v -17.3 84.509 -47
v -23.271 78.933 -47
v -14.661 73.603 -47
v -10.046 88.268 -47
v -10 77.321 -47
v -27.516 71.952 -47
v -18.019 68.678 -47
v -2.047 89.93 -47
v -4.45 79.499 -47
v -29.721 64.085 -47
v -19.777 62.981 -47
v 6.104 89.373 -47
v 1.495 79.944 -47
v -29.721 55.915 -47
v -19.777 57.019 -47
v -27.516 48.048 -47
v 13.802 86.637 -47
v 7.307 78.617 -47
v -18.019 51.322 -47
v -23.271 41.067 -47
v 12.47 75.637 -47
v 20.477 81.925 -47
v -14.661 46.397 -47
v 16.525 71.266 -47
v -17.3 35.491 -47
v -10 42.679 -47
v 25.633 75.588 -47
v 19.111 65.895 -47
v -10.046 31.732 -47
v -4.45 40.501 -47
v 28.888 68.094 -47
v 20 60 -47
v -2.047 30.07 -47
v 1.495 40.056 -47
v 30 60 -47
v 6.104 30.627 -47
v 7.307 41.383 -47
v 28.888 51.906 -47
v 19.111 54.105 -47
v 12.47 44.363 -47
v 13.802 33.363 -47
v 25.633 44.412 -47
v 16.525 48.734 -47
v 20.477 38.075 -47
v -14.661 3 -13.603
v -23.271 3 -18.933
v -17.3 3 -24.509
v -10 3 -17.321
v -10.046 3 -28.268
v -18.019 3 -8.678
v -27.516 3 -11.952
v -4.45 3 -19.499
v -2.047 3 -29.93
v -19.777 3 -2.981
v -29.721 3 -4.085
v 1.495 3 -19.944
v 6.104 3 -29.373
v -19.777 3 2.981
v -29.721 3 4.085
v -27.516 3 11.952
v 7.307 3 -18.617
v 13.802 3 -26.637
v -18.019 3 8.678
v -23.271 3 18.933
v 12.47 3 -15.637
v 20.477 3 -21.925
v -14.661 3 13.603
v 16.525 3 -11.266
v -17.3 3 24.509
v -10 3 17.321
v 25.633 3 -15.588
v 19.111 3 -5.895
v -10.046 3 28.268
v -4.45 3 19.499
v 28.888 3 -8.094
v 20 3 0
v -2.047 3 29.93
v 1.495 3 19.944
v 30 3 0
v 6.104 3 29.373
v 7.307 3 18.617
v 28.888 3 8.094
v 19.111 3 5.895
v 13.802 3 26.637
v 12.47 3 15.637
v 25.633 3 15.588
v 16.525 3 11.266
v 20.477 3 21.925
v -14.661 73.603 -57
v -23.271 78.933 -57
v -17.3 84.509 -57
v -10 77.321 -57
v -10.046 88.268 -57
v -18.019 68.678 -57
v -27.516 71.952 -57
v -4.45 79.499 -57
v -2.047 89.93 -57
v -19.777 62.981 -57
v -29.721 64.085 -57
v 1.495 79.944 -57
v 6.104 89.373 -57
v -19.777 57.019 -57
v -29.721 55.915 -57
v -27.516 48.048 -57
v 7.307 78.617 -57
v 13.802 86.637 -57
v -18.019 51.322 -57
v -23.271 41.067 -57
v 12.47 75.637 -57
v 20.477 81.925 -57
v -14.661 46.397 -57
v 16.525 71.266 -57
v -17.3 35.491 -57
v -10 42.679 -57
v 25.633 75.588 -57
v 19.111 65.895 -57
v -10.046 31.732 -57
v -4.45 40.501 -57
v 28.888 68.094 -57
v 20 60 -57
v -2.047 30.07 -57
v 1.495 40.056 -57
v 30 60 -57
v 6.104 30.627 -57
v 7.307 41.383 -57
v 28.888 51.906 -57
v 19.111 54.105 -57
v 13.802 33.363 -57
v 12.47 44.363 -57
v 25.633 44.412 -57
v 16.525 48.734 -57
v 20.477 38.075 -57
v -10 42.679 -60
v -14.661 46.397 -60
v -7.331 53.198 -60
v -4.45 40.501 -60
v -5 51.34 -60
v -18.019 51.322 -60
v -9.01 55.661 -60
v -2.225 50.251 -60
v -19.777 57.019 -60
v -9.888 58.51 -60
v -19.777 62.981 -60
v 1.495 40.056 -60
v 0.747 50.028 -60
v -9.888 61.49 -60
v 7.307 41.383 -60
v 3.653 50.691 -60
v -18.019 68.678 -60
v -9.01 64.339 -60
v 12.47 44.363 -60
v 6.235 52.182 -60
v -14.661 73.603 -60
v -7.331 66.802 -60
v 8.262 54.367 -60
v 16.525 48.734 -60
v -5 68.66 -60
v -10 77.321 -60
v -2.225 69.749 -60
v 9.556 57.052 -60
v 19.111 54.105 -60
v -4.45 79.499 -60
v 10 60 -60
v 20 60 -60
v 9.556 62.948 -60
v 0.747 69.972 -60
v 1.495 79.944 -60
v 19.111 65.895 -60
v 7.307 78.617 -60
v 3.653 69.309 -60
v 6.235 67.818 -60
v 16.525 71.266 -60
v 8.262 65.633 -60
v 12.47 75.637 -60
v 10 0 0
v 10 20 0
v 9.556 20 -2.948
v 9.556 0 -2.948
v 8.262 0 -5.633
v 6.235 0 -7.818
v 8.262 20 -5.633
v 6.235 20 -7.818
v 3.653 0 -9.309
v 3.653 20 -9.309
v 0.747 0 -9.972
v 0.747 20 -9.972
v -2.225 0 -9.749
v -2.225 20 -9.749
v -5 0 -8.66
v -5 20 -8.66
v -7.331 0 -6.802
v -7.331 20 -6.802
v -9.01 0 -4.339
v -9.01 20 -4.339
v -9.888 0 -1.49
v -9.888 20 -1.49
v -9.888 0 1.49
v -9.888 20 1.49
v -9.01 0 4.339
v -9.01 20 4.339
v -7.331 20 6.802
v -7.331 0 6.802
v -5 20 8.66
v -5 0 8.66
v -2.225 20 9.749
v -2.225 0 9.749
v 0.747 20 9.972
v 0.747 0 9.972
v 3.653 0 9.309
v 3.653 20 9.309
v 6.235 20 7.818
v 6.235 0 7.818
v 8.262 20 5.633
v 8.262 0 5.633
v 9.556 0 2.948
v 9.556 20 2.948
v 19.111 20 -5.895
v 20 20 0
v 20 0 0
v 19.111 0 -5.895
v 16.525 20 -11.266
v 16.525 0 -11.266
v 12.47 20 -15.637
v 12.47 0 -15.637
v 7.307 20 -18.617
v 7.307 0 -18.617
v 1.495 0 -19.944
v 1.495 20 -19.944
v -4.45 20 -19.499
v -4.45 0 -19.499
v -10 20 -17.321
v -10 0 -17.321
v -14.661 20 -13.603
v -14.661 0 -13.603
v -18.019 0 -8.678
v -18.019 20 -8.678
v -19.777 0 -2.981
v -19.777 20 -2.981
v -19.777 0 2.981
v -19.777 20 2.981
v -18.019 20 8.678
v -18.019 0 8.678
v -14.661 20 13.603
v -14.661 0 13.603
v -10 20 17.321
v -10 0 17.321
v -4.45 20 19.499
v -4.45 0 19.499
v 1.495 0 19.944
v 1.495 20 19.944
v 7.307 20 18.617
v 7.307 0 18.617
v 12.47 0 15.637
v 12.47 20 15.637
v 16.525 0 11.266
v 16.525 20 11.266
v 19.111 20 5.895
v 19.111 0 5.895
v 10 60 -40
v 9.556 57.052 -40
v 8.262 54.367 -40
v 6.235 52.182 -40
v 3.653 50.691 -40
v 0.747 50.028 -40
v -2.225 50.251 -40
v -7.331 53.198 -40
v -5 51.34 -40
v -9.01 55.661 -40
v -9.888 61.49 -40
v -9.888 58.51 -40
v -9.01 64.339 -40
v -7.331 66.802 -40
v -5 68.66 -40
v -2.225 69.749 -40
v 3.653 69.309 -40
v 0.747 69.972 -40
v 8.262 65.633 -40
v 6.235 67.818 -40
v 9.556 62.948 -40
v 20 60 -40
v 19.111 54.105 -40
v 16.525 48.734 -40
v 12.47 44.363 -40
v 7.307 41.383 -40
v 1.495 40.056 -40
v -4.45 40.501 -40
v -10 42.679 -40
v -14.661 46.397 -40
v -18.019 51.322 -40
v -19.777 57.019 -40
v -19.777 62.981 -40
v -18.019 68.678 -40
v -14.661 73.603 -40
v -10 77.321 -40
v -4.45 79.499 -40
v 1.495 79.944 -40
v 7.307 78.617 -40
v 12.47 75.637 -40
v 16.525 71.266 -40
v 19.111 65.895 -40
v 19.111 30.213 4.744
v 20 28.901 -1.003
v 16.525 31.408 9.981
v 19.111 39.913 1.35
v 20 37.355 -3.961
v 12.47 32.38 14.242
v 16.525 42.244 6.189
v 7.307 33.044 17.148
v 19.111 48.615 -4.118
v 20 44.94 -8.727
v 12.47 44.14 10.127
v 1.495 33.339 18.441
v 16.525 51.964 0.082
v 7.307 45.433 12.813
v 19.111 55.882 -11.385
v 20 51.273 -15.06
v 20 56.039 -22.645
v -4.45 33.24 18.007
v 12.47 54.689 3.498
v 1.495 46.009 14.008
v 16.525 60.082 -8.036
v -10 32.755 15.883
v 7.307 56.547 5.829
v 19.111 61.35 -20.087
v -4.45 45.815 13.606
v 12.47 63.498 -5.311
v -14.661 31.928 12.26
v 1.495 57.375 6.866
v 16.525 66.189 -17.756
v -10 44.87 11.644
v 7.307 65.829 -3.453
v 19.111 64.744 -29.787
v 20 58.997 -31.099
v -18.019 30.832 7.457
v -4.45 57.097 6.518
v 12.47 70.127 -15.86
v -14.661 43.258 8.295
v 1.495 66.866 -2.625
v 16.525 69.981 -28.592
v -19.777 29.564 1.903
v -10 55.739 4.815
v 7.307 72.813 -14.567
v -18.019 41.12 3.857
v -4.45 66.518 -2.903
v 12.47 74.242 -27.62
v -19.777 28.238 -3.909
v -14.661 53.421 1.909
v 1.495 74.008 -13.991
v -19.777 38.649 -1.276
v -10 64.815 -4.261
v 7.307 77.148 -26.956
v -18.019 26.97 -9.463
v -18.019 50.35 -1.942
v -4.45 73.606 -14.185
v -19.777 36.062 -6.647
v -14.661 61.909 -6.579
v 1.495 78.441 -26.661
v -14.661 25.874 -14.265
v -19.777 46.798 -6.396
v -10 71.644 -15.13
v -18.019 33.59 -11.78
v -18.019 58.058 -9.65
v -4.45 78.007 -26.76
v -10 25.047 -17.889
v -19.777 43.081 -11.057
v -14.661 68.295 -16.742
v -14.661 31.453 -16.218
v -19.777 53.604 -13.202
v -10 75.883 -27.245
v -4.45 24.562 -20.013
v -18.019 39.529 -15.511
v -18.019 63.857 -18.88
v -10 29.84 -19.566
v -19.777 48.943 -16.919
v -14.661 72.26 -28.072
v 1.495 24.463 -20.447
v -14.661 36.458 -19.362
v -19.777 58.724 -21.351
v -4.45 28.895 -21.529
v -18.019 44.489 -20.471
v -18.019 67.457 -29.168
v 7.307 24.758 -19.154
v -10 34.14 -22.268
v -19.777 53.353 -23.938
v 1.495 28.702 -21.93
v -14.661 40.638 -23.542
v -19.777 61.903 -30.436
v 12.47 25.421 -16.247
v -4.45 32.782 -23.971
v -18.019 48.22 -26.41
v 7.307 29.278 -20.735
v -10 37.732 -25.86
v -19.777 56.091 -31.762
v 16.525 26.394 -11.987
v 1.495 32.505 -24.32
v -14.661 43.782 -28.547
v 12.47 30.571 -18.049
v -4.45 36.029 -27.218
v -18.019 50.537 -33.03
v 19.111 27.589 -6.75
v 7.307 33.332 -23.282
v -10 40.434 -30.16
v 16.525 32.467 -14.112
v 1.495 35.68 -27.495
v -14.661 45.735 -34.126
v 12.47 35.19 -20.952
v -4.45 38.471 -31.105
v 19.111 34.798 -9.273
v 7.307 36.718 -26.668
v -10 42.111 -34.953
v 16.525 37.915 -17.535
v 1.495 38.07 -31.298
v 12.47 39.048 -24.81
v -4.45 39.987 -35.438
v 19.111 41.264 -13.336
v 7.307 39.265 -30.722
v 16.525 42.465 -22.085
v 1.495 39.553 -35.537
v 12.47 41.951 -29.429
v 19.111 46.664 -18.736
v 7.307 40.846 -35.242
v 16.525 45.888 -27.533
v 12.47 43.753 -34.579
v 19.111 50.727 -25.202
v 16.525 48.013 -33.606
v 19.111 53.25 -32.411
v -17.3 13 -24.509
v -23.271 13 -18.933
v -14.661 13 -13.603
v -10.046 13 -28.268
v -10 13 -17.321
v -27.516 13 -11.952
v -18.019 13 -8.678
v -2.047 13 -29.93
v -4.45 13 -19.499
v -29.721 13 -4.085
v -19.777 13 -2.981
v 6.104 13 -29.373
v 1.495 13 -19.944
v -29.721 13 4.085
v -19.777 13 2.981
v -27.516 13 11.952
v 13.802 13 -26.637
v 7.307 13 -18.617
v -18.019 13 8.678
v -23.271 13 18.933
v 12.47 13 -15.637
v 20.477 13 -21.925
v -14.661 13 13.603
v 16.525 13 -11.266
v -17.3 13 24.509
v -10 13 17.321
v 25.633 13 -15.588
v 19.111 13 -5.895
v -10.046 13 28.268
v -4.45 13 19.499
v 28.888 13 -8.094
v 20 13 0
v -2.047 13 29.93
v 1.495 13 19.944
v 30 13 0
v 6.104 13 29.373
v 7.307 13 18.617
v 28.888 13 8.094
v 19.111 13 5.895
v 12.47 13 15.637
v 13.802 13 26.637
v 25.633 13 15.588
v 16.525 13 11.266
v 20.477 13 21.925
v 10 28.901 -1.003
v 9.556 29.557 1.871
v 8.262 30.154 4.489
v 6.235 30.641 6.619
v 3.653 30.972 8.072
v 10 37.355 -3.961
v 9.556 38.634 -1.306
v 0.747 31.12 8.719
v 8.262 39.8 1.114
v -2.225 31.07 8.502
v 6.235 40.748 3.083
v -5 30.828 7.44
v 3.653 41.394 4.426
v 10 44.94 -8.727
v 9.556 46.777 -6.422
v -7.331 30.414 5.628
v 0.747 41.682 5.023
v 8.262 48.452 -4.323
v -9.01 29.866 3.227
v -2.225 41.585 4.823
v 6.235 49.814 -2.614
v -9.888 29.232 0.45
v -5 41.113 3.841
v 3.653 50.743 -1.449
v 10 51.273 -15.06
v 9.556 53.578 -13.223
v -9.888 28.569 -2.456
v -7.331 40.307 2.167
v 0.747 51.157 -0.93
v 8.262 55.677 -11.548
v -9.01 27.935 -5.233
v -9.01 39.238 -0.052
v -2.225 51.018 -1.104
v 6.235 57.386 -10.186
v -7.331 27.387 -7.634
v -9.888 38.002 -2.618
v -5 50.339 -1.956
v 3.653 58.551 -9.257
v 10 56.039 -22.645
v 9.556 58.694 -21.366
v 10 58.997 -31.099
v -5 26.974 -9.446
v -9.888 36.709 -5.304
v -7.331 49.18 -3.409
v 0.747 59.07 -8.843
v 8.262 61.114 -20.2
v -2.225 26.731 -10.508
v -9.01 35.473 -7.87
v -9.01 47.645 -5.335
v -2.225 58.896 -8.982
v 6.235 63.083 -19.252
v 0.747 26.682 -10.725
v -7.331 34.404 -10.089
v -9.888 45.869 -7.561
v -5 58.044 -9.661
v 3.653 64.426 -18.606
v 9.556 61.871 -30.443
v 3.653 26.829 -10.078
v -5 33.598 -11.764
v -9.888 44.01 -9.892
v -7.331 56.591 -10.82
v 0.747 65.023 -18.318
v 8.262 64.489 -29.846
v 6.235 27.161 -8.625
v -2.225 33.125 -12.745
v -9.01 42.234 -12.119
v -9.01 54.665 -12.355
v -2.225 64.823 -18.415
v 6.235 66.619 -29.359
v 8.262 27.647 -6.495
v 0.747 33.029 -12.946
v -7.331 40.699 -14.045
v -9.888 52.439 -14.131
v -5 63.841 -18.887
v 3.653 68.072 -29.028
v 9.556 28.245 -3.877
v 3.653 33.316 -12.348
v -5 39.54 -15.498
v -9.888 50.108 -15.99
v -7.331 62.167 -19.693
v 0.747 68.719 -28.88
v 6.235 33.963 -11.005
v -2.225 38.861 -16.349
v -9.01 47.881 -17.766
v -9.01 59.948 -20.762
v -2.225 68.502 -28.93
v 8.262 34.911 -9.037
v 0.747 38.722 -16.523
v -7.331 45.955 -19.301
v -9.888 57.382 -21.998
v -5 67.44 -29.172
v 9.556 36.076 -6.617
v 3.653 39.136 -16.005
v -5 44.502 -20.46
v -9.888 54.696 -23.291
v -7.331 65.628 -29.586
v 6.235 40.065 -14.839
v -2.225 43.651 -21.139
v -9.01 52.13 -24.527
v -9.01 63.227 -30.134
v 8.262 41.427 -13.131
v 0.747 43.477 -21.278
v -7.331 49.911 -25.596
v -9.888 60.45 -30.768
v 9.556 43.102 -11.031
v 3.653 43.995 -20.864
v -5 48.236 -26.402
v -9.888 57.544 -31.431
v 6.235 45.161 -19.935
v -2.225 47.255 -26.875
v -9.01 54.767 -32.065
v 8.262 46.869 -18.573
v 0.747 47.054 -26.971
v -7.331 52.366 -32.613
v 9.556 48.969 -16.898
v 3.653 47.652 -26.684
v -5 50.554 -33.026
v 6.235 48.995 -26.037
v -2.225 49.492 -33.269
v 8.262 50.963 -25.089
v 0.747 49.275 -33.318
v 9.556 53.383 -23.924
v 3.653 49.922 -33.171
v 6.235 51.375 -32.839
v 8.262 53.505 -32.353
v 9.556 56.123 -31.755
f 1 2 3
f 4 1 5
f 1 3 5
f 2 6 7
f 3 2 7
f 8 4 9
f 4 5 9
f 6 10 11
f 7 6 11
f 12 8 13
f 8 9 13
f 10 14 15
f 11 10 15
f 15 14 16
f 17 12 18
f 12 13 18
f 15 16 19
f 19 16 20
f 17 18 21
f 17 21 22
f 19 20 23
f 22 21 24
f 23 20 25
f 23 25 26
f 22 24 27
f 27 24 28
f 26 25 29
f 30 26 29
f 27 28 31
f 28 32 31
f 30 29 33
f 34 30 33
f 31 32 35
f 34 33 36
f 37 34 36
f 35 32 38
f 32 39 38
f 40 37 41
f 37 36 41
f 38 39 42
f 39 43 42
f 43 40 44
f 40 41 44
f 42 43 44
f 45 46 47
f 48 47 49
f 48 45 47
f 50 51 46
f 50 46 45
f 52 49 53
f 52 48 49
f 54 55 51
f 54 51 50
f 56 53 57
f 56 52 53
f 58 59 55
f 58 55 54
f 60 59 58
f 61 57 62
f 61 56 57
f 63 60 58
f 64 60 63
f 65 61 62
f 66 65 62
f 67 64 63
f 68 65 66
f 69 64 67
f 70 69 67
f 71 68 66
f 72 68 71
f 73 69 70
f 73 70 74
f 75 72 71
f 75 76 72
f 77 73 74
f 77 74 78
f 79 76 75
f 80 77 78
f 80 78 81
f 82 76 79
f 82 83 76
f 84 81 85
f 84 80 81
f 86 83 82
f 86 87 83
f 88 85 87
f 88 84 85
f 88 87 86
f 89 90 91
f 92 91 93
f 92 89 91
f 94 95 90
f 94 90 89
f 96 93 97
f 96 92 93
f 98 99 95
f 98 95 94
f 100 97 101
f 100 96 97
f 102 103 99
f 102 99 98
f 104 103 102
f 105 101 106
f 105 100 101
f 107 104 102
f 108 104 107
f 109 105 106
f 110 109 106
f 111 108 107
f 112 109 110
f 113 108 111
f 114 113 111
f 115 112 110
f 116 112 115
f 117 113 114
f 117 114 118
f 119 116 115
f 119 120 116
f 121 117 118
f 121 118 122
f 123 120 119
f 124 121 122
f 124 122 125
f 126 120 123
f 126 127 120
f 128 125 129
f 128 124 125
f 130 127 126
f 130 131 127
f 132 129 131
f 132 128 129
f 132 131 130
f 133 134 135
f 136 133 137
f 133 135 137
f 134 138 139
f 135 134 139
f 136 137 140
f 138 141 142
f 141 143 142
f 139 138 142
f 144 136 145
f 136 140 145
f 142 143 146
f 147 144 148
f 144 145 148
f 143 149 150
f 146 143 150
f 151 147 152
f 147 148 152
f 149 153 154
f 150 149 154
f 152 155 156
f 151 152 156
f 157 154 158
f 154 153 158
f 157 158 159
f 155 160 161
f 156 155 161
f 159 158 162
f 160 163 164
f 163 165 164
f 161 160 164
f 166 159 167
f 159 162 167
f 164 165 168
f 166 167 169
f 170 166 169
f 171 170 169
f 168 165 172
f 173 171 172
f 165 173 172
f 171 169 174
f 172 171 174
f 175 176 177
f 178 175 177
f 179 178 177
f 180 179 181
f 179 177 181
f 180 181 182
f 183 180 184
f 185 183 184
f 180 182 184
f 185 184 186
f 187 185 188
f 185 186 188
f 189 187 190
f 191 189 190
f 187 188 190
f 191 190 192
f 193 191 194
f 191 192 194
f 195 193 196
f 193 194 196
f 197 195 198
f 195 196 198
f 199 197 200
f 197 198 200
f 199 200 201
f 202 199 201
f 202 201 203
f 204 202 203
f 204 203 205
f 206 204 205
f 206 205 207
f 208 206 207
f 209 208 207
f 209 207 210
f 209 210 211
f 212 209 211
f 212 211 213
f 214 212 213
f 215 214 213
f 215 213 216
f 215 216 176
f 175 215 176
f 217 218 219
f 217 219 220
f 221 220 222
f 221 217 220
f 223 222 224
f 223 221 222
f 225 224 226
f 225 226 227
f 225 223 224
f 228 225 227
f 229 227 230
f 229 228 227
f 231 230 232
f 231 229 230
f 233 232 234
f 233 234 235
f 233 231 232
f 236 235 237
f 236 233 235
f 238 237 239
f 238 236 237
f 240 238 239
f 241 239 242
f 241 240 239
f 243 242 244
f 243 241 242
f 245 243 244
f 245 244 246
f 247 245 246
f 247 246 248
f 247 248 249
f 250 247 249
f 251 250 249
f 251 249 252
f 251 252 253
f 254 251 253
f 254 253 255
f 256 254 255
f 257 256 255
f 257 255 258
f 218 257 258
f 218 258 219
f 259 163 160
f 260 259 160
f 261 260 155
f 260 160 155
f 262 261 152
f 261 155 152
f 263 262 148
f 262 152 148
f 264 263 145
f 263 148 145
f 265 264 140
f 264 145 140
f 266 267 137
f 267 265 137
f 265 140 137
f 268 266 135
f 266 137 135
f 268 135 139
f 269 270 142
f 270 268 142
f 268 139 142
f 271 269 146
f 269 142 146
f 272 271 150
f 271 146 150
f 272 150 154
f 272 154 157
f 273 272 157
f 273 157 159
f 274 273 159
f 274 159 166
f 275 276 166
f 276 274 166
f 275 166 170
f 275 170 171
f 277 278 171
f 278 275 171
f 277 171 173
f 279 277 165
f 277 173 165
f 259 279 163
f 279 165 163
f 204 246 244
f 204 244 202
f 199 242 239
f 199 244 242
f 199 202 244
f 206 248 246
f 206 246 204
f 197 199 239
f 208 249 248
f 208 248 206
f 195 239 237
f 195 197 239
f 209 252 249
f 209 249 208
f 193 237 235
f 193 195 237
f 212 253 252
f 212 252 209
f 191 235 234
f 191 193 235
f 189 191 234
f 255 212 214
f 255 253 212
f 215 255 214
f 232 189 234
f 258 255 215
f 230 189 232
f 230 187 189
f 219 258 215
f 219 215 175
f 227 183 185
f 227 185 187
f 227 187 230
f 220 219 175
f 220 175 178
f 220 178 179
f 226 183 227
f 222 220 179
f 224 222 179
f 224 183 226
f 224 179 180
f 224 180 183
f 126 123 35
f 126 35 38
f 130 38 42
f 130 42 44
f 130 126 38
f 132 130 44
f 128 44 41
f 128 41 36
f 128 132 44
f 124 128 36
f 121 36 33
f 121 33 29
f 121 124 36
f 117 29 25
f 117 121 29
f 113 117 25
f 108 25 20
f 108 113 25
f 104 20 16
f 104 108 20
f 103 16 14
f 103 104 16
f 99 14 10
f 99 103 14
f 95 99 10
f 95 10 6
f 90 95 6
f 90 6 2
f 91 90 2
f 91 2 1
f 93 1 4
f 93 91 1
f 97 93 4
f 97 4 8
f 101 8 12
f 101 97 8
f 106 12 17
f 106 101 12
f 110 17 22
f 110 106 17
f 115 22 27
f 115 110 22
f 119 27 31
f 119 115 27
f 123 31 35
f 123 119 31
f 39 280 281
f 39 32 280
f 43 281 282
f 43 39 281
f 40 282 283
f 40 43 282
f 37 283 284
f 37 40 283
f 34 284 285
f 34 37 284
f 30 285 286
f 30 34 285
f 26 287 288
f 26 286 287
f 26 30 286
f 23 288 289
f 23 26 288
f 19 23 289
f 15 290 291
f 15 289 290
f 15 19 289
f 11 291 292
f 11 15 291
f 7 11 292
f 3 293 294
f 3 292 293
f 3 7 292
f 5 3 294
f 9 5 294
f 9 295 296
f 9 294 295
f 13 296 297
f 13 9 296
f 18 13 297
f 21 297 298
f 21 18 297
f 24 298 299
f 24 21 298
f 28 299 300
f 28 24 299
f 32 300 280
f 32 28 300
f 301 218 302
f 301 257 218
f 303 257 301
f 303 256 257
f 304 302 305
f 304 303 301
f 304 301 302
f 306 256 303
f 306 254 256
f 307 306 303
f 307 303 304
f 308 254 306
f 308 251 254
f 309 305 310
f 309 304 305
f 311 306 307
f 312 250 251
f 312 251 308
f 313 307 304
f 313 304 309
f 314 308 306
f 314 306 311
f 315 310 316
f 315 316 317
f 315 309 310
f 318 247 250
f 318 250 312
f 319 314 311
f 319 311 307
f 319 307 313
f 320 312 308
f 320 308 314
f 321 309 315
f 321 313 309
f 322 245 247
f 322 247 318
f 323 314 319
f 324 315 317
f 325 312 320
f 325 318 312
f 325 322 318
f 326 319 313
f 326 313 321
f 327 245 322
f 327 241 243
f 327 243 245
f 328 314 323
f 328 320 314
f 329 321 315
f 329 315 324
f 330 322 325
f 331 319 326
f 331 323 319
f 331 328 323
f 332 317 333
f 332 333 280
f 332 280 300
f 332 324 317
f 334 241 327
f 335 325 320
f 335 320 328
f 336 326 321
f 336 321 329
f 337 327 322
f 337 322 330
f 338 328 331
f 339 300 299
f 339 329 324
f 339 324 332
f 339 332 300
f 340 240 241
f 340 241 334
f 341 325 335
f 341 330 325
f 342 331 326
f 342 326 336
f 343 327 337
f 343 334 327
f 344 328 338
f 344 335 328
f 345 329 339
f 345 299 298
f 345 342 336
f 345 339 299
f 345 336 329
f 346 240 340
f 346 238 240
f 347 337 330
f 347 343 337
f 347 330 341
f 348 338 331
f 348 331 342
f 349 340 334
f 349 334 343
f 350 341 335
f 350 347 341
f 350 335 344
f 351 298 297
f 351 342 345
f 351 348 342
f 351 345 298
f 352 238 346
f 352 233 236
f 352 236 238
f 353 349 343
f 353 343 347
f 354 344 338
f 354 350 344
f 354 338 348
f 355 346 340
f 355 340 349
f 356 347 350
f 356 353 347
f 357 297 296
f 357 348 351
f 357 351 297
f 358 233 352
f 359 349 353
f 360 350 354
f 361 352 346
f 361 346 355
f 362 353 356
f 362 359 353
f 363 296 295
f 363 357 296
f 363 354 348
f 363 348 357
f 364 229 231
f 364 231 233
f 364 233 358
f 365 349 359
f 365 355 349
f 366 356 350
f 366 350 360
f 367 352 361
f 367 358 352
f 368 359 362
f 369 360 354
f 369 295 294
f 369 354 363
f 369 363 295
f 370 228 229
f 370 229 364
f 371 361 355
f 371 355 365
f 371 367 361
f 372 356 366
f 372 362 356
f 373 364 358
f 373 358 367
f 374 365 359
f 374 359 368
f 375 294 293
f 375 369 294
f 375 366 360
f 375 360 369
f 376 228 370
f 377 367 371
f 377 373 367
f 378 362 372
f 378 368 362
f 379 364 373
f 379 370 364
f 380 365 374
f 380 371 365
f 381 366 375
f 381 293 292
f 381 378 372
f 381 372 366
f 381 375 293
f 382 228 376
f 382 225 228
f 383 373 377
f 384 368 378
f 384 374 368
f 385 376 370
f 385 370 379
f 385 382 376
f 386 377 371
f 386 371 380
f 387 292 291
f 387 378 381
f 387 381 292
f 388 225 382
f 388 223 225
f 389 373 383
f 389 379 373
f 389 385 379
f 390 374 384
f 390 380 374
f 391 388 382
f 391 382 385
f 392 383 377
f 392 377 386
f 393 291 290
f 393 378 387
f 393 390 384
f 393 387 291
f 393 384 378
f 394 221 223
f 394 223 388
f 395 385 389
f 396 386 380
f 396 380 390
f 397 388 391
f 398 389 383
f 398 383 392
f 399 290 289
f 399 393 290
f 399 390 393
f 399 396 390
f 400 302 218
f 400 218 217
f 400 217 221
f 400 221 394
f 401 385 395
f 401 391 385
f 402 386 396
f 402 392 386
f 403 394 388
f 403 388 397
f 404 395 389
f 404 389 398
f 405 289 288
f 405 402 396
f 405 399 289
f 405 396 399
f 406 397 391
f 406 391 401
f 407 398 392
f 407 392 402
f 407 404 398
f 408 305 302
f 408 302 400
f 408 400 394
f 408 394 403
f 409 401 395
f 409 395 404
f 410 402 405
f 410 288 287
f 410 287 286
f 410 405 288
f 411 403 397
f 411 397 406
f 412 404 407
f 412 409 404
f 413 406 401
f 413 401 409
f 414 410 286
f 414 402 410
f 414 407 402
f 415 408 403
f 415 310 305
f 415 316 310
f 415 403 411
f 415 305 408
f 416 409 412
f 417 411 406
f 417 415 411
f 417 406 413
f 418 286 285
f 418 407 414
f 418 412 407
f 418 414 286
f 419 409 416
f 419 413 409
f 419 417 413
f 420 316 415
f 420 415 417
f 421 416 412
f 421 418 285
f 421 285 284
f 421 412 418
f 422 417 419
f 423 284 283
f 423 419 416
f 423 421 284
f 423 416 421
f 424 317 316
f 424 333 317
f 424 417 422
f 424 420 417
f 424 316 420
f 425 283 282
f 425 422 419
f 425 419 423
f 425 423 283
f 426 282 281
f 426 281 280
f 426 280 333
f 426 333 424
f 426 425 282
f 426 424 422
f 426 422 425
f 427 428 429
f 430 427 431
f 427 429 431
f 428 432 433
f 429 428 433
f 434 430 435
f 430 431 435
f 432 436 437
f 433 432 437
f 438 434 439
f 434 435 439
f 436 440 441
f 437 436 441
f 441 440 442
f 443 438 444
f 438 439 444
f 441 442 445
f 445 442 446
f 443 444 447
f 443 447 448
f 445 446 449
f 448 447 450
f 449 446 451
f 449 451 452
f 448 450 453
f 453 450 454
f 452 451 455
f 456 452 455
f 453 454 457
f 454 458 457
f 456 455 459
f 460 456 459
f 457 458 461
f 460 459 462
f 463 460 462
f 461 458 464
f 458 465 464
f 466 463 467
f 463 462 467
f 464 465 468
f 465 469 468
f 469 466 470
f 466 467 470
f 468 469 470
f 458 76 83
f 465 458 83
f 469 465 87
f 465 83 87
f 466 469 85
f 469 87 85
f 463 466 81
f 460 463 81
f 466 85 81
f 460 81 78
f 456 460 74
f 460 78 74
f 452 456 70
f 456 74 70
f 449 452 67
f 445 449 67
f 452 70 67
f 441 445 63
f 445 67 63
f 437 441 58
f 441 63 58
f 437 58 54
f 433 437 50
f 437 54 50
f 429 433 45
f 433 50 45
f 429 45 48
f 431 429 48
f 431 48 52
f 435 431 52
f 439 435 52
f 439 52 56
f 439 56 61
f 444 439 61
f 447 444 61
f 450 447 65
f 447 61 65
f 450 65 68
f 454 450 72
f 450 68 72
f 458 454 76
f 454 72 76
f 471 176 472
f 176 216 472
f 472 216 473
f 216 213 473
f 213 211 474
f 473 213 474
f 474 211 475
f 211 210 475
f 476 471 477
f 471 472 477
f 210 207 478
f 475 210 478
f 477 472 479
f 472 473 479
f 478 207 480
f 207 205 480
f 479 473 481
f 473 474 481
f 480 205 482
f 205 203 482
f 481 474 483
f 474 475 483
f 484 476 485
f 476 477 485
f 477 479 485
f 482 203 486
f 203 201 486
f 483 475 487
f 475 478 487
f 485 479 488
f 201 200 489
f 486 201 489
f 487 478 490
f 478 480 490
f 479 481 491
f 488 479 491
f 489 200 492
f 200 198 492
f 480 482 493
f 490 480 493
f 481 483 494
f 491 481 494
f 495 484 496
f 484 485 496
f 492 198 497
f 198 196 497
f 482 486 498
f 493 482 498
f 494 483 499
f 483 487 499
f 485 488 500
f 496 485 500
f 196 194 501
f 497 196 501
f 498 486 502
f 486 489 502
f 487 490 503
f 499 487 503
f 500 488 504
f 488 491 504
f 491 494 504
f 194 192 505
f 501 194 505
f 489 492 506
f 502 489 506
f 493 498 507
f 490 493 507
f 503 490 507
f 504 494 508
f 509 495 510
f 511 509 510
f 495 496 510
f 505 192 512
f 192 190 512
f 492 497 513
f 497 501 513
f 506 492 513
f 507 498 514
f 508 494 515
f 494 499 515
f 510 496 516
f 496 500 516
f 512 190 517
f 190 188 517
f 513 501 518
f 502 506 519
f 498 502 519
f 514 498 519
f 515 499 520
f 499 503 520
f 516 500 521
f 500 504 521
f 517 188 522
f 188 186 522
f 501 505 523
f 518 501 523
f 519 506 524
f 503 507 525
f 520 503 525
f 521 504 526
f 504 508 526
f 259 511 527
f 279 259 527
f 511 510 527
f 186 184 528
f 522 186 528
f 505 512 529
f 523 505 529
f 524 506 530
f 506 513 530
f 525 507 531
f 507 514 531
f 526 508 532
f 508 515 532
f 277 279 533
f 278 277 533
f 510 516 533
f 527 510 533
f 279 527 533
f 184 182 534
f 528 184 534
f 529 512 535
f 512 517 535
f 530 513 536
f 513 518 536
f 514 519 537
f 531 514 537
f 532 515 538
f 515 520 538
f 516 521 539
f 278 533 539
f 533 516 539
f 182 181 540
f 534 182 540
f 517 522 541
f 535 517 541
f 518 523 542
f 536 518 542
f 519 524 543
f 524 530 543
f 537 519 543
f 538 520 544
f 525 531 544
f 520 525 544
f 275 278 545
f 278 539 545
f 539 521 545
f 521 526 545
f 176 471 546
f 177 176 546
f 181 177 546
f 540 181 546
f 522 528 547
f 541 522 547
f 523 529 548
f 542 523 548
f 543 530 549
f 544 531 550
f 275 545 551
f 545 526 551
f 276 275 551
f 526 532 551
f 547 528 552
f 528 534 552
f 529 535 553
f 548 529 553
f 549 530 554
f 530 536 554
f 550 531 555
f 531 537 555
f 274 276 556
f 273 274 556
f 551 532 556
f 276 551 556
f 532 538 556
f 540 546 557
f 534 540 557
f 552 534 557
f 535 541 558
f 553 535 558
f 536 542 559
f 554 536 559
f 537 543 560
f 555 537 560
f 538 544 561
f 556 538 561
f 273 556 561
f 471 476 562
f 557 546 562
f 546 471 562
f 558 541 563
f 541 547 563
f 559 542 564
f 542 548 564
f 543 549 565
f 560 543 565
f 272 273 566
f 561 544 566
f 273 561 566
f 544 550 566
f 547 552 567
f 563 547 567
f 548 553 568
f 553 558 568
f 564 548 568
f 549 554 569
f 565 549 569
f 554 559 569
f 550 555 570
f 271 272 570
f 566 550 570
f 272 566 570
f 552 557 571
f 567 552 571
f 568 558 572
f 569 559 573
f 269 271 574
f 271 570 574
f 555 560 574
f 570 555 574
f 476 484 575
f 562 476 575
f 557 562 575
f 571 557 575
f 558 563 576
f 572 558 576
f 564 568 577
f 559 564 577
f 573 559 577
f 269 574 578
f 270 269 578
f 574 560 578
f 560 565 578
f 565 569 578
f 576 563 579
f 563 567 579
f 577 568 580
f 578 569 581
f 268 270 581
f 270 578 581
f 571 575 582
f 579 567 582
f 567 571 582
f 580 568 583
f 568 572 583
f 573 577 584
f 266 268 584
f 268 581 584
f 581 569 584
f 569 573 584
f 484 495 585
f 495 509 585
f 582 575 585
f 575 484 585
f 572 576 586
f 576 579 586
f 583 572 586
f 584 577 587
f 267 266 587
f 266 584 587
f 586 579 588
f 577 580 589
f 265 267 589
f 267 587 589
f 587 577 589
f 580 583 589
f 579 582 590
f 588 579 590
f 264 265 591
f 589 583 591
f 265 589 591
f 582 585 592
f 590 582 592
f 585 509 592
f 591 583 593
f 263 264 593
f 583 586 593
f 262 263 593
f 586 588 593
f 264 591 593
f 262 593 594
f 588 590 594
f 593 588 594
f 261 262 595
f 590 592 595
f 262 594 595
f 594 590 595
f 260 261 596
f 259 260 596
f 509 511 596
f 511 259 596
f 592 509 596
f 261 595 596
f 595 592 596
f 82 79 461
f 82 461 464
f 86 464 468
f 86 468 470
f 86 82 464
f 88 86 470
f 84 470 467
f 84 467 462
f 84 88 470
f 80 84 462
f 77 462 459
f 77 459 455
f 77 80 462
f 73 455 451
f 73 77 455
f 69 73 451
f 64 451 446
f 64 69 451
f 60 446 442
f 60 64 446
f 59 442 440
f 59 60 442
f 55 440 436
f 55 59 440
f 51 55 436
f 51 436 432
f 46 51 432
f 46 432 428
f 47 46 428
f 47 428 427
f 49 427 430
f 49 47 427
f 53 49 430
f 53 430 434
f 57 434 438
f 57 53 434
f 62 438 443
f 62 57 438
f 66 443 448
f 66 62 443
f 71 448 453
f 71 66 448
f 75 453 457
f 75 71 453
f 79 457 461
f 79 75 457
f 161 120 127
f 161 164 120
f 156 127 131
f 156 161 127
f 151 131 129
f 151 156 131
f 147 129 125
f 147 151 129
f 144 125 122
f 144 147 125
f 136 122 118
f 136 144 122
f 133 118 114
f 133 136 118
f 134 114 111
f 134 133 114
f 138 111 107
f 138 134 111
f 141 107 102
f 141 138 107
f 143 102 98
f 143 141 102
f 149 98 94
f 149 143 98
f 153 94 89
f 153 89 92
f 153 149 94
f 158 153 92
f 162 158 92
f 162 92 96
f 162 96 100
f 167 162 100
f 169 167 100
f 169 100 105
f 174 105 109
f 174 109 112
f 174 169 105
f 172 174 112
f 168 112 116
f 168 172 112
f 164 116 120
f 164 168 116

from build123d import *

# Parameters (mm, degrees)
F0_R     = 20
F0_R_2   = 10
F4_R     = 30
F4_R_2   = 20
F5_DEPTH = 10
F8_DEPTH = 20
F7_R     = 30
F7_R_2   = 20
F9_DEPTH = 10


with BuildPart() as f2:
    # F2: sweep along a path in F1
    with BuildLine(Plane.YZ) as f2_path:
        Line((0, 0), (20, 0))
        ThreePointArc((20, 0), (48.2842712475, -11.7157287525), (60, -40))
        Line((60, -40), (60, -60))
    # F0 (on Front) → F2 (sweep)
    with BuildSketch(Plane.XZ):
        Circle(F0_R)
        Circle(F0_R_2, mode=Mode.SUBTRACT)
    sweep(path=f2_path.line)

    # F8 (add): a face of the model
    f8_faces = [f2.faces().sort_by_distance(p)[0] for p in [
        (-19.4343145751, 60, -60),
    ]]
    extrude(f8_faces, amount=-F8_DEPTH)

    # F7 (on offset) → F9 (join)
    with BuildSketch(Plane(origin=(0, 0, -57), x_dir=(1, 0, 0), z_dir=(0, 0, -1))):
        with Locations((0, -60)):
            Circle(F7_R)
        with Locations((0, -60)):
            Circle(F7_R_2, mode=Mode.SUBTRACT)
    extrude(amount=-F9_DEPTH)


with BuildPart() as f5:
    # F4 (on offset) → F5 (new body)
    with BuildSketch(Plane.XZ.offset(-3)):
        Circle(F4_R)
        Circle(F4_R_2, mode=Mode.SUBTRACT)
    extrude(amount=-F5_DEPTH)


solid = Compound([f2.part, f5.part])
